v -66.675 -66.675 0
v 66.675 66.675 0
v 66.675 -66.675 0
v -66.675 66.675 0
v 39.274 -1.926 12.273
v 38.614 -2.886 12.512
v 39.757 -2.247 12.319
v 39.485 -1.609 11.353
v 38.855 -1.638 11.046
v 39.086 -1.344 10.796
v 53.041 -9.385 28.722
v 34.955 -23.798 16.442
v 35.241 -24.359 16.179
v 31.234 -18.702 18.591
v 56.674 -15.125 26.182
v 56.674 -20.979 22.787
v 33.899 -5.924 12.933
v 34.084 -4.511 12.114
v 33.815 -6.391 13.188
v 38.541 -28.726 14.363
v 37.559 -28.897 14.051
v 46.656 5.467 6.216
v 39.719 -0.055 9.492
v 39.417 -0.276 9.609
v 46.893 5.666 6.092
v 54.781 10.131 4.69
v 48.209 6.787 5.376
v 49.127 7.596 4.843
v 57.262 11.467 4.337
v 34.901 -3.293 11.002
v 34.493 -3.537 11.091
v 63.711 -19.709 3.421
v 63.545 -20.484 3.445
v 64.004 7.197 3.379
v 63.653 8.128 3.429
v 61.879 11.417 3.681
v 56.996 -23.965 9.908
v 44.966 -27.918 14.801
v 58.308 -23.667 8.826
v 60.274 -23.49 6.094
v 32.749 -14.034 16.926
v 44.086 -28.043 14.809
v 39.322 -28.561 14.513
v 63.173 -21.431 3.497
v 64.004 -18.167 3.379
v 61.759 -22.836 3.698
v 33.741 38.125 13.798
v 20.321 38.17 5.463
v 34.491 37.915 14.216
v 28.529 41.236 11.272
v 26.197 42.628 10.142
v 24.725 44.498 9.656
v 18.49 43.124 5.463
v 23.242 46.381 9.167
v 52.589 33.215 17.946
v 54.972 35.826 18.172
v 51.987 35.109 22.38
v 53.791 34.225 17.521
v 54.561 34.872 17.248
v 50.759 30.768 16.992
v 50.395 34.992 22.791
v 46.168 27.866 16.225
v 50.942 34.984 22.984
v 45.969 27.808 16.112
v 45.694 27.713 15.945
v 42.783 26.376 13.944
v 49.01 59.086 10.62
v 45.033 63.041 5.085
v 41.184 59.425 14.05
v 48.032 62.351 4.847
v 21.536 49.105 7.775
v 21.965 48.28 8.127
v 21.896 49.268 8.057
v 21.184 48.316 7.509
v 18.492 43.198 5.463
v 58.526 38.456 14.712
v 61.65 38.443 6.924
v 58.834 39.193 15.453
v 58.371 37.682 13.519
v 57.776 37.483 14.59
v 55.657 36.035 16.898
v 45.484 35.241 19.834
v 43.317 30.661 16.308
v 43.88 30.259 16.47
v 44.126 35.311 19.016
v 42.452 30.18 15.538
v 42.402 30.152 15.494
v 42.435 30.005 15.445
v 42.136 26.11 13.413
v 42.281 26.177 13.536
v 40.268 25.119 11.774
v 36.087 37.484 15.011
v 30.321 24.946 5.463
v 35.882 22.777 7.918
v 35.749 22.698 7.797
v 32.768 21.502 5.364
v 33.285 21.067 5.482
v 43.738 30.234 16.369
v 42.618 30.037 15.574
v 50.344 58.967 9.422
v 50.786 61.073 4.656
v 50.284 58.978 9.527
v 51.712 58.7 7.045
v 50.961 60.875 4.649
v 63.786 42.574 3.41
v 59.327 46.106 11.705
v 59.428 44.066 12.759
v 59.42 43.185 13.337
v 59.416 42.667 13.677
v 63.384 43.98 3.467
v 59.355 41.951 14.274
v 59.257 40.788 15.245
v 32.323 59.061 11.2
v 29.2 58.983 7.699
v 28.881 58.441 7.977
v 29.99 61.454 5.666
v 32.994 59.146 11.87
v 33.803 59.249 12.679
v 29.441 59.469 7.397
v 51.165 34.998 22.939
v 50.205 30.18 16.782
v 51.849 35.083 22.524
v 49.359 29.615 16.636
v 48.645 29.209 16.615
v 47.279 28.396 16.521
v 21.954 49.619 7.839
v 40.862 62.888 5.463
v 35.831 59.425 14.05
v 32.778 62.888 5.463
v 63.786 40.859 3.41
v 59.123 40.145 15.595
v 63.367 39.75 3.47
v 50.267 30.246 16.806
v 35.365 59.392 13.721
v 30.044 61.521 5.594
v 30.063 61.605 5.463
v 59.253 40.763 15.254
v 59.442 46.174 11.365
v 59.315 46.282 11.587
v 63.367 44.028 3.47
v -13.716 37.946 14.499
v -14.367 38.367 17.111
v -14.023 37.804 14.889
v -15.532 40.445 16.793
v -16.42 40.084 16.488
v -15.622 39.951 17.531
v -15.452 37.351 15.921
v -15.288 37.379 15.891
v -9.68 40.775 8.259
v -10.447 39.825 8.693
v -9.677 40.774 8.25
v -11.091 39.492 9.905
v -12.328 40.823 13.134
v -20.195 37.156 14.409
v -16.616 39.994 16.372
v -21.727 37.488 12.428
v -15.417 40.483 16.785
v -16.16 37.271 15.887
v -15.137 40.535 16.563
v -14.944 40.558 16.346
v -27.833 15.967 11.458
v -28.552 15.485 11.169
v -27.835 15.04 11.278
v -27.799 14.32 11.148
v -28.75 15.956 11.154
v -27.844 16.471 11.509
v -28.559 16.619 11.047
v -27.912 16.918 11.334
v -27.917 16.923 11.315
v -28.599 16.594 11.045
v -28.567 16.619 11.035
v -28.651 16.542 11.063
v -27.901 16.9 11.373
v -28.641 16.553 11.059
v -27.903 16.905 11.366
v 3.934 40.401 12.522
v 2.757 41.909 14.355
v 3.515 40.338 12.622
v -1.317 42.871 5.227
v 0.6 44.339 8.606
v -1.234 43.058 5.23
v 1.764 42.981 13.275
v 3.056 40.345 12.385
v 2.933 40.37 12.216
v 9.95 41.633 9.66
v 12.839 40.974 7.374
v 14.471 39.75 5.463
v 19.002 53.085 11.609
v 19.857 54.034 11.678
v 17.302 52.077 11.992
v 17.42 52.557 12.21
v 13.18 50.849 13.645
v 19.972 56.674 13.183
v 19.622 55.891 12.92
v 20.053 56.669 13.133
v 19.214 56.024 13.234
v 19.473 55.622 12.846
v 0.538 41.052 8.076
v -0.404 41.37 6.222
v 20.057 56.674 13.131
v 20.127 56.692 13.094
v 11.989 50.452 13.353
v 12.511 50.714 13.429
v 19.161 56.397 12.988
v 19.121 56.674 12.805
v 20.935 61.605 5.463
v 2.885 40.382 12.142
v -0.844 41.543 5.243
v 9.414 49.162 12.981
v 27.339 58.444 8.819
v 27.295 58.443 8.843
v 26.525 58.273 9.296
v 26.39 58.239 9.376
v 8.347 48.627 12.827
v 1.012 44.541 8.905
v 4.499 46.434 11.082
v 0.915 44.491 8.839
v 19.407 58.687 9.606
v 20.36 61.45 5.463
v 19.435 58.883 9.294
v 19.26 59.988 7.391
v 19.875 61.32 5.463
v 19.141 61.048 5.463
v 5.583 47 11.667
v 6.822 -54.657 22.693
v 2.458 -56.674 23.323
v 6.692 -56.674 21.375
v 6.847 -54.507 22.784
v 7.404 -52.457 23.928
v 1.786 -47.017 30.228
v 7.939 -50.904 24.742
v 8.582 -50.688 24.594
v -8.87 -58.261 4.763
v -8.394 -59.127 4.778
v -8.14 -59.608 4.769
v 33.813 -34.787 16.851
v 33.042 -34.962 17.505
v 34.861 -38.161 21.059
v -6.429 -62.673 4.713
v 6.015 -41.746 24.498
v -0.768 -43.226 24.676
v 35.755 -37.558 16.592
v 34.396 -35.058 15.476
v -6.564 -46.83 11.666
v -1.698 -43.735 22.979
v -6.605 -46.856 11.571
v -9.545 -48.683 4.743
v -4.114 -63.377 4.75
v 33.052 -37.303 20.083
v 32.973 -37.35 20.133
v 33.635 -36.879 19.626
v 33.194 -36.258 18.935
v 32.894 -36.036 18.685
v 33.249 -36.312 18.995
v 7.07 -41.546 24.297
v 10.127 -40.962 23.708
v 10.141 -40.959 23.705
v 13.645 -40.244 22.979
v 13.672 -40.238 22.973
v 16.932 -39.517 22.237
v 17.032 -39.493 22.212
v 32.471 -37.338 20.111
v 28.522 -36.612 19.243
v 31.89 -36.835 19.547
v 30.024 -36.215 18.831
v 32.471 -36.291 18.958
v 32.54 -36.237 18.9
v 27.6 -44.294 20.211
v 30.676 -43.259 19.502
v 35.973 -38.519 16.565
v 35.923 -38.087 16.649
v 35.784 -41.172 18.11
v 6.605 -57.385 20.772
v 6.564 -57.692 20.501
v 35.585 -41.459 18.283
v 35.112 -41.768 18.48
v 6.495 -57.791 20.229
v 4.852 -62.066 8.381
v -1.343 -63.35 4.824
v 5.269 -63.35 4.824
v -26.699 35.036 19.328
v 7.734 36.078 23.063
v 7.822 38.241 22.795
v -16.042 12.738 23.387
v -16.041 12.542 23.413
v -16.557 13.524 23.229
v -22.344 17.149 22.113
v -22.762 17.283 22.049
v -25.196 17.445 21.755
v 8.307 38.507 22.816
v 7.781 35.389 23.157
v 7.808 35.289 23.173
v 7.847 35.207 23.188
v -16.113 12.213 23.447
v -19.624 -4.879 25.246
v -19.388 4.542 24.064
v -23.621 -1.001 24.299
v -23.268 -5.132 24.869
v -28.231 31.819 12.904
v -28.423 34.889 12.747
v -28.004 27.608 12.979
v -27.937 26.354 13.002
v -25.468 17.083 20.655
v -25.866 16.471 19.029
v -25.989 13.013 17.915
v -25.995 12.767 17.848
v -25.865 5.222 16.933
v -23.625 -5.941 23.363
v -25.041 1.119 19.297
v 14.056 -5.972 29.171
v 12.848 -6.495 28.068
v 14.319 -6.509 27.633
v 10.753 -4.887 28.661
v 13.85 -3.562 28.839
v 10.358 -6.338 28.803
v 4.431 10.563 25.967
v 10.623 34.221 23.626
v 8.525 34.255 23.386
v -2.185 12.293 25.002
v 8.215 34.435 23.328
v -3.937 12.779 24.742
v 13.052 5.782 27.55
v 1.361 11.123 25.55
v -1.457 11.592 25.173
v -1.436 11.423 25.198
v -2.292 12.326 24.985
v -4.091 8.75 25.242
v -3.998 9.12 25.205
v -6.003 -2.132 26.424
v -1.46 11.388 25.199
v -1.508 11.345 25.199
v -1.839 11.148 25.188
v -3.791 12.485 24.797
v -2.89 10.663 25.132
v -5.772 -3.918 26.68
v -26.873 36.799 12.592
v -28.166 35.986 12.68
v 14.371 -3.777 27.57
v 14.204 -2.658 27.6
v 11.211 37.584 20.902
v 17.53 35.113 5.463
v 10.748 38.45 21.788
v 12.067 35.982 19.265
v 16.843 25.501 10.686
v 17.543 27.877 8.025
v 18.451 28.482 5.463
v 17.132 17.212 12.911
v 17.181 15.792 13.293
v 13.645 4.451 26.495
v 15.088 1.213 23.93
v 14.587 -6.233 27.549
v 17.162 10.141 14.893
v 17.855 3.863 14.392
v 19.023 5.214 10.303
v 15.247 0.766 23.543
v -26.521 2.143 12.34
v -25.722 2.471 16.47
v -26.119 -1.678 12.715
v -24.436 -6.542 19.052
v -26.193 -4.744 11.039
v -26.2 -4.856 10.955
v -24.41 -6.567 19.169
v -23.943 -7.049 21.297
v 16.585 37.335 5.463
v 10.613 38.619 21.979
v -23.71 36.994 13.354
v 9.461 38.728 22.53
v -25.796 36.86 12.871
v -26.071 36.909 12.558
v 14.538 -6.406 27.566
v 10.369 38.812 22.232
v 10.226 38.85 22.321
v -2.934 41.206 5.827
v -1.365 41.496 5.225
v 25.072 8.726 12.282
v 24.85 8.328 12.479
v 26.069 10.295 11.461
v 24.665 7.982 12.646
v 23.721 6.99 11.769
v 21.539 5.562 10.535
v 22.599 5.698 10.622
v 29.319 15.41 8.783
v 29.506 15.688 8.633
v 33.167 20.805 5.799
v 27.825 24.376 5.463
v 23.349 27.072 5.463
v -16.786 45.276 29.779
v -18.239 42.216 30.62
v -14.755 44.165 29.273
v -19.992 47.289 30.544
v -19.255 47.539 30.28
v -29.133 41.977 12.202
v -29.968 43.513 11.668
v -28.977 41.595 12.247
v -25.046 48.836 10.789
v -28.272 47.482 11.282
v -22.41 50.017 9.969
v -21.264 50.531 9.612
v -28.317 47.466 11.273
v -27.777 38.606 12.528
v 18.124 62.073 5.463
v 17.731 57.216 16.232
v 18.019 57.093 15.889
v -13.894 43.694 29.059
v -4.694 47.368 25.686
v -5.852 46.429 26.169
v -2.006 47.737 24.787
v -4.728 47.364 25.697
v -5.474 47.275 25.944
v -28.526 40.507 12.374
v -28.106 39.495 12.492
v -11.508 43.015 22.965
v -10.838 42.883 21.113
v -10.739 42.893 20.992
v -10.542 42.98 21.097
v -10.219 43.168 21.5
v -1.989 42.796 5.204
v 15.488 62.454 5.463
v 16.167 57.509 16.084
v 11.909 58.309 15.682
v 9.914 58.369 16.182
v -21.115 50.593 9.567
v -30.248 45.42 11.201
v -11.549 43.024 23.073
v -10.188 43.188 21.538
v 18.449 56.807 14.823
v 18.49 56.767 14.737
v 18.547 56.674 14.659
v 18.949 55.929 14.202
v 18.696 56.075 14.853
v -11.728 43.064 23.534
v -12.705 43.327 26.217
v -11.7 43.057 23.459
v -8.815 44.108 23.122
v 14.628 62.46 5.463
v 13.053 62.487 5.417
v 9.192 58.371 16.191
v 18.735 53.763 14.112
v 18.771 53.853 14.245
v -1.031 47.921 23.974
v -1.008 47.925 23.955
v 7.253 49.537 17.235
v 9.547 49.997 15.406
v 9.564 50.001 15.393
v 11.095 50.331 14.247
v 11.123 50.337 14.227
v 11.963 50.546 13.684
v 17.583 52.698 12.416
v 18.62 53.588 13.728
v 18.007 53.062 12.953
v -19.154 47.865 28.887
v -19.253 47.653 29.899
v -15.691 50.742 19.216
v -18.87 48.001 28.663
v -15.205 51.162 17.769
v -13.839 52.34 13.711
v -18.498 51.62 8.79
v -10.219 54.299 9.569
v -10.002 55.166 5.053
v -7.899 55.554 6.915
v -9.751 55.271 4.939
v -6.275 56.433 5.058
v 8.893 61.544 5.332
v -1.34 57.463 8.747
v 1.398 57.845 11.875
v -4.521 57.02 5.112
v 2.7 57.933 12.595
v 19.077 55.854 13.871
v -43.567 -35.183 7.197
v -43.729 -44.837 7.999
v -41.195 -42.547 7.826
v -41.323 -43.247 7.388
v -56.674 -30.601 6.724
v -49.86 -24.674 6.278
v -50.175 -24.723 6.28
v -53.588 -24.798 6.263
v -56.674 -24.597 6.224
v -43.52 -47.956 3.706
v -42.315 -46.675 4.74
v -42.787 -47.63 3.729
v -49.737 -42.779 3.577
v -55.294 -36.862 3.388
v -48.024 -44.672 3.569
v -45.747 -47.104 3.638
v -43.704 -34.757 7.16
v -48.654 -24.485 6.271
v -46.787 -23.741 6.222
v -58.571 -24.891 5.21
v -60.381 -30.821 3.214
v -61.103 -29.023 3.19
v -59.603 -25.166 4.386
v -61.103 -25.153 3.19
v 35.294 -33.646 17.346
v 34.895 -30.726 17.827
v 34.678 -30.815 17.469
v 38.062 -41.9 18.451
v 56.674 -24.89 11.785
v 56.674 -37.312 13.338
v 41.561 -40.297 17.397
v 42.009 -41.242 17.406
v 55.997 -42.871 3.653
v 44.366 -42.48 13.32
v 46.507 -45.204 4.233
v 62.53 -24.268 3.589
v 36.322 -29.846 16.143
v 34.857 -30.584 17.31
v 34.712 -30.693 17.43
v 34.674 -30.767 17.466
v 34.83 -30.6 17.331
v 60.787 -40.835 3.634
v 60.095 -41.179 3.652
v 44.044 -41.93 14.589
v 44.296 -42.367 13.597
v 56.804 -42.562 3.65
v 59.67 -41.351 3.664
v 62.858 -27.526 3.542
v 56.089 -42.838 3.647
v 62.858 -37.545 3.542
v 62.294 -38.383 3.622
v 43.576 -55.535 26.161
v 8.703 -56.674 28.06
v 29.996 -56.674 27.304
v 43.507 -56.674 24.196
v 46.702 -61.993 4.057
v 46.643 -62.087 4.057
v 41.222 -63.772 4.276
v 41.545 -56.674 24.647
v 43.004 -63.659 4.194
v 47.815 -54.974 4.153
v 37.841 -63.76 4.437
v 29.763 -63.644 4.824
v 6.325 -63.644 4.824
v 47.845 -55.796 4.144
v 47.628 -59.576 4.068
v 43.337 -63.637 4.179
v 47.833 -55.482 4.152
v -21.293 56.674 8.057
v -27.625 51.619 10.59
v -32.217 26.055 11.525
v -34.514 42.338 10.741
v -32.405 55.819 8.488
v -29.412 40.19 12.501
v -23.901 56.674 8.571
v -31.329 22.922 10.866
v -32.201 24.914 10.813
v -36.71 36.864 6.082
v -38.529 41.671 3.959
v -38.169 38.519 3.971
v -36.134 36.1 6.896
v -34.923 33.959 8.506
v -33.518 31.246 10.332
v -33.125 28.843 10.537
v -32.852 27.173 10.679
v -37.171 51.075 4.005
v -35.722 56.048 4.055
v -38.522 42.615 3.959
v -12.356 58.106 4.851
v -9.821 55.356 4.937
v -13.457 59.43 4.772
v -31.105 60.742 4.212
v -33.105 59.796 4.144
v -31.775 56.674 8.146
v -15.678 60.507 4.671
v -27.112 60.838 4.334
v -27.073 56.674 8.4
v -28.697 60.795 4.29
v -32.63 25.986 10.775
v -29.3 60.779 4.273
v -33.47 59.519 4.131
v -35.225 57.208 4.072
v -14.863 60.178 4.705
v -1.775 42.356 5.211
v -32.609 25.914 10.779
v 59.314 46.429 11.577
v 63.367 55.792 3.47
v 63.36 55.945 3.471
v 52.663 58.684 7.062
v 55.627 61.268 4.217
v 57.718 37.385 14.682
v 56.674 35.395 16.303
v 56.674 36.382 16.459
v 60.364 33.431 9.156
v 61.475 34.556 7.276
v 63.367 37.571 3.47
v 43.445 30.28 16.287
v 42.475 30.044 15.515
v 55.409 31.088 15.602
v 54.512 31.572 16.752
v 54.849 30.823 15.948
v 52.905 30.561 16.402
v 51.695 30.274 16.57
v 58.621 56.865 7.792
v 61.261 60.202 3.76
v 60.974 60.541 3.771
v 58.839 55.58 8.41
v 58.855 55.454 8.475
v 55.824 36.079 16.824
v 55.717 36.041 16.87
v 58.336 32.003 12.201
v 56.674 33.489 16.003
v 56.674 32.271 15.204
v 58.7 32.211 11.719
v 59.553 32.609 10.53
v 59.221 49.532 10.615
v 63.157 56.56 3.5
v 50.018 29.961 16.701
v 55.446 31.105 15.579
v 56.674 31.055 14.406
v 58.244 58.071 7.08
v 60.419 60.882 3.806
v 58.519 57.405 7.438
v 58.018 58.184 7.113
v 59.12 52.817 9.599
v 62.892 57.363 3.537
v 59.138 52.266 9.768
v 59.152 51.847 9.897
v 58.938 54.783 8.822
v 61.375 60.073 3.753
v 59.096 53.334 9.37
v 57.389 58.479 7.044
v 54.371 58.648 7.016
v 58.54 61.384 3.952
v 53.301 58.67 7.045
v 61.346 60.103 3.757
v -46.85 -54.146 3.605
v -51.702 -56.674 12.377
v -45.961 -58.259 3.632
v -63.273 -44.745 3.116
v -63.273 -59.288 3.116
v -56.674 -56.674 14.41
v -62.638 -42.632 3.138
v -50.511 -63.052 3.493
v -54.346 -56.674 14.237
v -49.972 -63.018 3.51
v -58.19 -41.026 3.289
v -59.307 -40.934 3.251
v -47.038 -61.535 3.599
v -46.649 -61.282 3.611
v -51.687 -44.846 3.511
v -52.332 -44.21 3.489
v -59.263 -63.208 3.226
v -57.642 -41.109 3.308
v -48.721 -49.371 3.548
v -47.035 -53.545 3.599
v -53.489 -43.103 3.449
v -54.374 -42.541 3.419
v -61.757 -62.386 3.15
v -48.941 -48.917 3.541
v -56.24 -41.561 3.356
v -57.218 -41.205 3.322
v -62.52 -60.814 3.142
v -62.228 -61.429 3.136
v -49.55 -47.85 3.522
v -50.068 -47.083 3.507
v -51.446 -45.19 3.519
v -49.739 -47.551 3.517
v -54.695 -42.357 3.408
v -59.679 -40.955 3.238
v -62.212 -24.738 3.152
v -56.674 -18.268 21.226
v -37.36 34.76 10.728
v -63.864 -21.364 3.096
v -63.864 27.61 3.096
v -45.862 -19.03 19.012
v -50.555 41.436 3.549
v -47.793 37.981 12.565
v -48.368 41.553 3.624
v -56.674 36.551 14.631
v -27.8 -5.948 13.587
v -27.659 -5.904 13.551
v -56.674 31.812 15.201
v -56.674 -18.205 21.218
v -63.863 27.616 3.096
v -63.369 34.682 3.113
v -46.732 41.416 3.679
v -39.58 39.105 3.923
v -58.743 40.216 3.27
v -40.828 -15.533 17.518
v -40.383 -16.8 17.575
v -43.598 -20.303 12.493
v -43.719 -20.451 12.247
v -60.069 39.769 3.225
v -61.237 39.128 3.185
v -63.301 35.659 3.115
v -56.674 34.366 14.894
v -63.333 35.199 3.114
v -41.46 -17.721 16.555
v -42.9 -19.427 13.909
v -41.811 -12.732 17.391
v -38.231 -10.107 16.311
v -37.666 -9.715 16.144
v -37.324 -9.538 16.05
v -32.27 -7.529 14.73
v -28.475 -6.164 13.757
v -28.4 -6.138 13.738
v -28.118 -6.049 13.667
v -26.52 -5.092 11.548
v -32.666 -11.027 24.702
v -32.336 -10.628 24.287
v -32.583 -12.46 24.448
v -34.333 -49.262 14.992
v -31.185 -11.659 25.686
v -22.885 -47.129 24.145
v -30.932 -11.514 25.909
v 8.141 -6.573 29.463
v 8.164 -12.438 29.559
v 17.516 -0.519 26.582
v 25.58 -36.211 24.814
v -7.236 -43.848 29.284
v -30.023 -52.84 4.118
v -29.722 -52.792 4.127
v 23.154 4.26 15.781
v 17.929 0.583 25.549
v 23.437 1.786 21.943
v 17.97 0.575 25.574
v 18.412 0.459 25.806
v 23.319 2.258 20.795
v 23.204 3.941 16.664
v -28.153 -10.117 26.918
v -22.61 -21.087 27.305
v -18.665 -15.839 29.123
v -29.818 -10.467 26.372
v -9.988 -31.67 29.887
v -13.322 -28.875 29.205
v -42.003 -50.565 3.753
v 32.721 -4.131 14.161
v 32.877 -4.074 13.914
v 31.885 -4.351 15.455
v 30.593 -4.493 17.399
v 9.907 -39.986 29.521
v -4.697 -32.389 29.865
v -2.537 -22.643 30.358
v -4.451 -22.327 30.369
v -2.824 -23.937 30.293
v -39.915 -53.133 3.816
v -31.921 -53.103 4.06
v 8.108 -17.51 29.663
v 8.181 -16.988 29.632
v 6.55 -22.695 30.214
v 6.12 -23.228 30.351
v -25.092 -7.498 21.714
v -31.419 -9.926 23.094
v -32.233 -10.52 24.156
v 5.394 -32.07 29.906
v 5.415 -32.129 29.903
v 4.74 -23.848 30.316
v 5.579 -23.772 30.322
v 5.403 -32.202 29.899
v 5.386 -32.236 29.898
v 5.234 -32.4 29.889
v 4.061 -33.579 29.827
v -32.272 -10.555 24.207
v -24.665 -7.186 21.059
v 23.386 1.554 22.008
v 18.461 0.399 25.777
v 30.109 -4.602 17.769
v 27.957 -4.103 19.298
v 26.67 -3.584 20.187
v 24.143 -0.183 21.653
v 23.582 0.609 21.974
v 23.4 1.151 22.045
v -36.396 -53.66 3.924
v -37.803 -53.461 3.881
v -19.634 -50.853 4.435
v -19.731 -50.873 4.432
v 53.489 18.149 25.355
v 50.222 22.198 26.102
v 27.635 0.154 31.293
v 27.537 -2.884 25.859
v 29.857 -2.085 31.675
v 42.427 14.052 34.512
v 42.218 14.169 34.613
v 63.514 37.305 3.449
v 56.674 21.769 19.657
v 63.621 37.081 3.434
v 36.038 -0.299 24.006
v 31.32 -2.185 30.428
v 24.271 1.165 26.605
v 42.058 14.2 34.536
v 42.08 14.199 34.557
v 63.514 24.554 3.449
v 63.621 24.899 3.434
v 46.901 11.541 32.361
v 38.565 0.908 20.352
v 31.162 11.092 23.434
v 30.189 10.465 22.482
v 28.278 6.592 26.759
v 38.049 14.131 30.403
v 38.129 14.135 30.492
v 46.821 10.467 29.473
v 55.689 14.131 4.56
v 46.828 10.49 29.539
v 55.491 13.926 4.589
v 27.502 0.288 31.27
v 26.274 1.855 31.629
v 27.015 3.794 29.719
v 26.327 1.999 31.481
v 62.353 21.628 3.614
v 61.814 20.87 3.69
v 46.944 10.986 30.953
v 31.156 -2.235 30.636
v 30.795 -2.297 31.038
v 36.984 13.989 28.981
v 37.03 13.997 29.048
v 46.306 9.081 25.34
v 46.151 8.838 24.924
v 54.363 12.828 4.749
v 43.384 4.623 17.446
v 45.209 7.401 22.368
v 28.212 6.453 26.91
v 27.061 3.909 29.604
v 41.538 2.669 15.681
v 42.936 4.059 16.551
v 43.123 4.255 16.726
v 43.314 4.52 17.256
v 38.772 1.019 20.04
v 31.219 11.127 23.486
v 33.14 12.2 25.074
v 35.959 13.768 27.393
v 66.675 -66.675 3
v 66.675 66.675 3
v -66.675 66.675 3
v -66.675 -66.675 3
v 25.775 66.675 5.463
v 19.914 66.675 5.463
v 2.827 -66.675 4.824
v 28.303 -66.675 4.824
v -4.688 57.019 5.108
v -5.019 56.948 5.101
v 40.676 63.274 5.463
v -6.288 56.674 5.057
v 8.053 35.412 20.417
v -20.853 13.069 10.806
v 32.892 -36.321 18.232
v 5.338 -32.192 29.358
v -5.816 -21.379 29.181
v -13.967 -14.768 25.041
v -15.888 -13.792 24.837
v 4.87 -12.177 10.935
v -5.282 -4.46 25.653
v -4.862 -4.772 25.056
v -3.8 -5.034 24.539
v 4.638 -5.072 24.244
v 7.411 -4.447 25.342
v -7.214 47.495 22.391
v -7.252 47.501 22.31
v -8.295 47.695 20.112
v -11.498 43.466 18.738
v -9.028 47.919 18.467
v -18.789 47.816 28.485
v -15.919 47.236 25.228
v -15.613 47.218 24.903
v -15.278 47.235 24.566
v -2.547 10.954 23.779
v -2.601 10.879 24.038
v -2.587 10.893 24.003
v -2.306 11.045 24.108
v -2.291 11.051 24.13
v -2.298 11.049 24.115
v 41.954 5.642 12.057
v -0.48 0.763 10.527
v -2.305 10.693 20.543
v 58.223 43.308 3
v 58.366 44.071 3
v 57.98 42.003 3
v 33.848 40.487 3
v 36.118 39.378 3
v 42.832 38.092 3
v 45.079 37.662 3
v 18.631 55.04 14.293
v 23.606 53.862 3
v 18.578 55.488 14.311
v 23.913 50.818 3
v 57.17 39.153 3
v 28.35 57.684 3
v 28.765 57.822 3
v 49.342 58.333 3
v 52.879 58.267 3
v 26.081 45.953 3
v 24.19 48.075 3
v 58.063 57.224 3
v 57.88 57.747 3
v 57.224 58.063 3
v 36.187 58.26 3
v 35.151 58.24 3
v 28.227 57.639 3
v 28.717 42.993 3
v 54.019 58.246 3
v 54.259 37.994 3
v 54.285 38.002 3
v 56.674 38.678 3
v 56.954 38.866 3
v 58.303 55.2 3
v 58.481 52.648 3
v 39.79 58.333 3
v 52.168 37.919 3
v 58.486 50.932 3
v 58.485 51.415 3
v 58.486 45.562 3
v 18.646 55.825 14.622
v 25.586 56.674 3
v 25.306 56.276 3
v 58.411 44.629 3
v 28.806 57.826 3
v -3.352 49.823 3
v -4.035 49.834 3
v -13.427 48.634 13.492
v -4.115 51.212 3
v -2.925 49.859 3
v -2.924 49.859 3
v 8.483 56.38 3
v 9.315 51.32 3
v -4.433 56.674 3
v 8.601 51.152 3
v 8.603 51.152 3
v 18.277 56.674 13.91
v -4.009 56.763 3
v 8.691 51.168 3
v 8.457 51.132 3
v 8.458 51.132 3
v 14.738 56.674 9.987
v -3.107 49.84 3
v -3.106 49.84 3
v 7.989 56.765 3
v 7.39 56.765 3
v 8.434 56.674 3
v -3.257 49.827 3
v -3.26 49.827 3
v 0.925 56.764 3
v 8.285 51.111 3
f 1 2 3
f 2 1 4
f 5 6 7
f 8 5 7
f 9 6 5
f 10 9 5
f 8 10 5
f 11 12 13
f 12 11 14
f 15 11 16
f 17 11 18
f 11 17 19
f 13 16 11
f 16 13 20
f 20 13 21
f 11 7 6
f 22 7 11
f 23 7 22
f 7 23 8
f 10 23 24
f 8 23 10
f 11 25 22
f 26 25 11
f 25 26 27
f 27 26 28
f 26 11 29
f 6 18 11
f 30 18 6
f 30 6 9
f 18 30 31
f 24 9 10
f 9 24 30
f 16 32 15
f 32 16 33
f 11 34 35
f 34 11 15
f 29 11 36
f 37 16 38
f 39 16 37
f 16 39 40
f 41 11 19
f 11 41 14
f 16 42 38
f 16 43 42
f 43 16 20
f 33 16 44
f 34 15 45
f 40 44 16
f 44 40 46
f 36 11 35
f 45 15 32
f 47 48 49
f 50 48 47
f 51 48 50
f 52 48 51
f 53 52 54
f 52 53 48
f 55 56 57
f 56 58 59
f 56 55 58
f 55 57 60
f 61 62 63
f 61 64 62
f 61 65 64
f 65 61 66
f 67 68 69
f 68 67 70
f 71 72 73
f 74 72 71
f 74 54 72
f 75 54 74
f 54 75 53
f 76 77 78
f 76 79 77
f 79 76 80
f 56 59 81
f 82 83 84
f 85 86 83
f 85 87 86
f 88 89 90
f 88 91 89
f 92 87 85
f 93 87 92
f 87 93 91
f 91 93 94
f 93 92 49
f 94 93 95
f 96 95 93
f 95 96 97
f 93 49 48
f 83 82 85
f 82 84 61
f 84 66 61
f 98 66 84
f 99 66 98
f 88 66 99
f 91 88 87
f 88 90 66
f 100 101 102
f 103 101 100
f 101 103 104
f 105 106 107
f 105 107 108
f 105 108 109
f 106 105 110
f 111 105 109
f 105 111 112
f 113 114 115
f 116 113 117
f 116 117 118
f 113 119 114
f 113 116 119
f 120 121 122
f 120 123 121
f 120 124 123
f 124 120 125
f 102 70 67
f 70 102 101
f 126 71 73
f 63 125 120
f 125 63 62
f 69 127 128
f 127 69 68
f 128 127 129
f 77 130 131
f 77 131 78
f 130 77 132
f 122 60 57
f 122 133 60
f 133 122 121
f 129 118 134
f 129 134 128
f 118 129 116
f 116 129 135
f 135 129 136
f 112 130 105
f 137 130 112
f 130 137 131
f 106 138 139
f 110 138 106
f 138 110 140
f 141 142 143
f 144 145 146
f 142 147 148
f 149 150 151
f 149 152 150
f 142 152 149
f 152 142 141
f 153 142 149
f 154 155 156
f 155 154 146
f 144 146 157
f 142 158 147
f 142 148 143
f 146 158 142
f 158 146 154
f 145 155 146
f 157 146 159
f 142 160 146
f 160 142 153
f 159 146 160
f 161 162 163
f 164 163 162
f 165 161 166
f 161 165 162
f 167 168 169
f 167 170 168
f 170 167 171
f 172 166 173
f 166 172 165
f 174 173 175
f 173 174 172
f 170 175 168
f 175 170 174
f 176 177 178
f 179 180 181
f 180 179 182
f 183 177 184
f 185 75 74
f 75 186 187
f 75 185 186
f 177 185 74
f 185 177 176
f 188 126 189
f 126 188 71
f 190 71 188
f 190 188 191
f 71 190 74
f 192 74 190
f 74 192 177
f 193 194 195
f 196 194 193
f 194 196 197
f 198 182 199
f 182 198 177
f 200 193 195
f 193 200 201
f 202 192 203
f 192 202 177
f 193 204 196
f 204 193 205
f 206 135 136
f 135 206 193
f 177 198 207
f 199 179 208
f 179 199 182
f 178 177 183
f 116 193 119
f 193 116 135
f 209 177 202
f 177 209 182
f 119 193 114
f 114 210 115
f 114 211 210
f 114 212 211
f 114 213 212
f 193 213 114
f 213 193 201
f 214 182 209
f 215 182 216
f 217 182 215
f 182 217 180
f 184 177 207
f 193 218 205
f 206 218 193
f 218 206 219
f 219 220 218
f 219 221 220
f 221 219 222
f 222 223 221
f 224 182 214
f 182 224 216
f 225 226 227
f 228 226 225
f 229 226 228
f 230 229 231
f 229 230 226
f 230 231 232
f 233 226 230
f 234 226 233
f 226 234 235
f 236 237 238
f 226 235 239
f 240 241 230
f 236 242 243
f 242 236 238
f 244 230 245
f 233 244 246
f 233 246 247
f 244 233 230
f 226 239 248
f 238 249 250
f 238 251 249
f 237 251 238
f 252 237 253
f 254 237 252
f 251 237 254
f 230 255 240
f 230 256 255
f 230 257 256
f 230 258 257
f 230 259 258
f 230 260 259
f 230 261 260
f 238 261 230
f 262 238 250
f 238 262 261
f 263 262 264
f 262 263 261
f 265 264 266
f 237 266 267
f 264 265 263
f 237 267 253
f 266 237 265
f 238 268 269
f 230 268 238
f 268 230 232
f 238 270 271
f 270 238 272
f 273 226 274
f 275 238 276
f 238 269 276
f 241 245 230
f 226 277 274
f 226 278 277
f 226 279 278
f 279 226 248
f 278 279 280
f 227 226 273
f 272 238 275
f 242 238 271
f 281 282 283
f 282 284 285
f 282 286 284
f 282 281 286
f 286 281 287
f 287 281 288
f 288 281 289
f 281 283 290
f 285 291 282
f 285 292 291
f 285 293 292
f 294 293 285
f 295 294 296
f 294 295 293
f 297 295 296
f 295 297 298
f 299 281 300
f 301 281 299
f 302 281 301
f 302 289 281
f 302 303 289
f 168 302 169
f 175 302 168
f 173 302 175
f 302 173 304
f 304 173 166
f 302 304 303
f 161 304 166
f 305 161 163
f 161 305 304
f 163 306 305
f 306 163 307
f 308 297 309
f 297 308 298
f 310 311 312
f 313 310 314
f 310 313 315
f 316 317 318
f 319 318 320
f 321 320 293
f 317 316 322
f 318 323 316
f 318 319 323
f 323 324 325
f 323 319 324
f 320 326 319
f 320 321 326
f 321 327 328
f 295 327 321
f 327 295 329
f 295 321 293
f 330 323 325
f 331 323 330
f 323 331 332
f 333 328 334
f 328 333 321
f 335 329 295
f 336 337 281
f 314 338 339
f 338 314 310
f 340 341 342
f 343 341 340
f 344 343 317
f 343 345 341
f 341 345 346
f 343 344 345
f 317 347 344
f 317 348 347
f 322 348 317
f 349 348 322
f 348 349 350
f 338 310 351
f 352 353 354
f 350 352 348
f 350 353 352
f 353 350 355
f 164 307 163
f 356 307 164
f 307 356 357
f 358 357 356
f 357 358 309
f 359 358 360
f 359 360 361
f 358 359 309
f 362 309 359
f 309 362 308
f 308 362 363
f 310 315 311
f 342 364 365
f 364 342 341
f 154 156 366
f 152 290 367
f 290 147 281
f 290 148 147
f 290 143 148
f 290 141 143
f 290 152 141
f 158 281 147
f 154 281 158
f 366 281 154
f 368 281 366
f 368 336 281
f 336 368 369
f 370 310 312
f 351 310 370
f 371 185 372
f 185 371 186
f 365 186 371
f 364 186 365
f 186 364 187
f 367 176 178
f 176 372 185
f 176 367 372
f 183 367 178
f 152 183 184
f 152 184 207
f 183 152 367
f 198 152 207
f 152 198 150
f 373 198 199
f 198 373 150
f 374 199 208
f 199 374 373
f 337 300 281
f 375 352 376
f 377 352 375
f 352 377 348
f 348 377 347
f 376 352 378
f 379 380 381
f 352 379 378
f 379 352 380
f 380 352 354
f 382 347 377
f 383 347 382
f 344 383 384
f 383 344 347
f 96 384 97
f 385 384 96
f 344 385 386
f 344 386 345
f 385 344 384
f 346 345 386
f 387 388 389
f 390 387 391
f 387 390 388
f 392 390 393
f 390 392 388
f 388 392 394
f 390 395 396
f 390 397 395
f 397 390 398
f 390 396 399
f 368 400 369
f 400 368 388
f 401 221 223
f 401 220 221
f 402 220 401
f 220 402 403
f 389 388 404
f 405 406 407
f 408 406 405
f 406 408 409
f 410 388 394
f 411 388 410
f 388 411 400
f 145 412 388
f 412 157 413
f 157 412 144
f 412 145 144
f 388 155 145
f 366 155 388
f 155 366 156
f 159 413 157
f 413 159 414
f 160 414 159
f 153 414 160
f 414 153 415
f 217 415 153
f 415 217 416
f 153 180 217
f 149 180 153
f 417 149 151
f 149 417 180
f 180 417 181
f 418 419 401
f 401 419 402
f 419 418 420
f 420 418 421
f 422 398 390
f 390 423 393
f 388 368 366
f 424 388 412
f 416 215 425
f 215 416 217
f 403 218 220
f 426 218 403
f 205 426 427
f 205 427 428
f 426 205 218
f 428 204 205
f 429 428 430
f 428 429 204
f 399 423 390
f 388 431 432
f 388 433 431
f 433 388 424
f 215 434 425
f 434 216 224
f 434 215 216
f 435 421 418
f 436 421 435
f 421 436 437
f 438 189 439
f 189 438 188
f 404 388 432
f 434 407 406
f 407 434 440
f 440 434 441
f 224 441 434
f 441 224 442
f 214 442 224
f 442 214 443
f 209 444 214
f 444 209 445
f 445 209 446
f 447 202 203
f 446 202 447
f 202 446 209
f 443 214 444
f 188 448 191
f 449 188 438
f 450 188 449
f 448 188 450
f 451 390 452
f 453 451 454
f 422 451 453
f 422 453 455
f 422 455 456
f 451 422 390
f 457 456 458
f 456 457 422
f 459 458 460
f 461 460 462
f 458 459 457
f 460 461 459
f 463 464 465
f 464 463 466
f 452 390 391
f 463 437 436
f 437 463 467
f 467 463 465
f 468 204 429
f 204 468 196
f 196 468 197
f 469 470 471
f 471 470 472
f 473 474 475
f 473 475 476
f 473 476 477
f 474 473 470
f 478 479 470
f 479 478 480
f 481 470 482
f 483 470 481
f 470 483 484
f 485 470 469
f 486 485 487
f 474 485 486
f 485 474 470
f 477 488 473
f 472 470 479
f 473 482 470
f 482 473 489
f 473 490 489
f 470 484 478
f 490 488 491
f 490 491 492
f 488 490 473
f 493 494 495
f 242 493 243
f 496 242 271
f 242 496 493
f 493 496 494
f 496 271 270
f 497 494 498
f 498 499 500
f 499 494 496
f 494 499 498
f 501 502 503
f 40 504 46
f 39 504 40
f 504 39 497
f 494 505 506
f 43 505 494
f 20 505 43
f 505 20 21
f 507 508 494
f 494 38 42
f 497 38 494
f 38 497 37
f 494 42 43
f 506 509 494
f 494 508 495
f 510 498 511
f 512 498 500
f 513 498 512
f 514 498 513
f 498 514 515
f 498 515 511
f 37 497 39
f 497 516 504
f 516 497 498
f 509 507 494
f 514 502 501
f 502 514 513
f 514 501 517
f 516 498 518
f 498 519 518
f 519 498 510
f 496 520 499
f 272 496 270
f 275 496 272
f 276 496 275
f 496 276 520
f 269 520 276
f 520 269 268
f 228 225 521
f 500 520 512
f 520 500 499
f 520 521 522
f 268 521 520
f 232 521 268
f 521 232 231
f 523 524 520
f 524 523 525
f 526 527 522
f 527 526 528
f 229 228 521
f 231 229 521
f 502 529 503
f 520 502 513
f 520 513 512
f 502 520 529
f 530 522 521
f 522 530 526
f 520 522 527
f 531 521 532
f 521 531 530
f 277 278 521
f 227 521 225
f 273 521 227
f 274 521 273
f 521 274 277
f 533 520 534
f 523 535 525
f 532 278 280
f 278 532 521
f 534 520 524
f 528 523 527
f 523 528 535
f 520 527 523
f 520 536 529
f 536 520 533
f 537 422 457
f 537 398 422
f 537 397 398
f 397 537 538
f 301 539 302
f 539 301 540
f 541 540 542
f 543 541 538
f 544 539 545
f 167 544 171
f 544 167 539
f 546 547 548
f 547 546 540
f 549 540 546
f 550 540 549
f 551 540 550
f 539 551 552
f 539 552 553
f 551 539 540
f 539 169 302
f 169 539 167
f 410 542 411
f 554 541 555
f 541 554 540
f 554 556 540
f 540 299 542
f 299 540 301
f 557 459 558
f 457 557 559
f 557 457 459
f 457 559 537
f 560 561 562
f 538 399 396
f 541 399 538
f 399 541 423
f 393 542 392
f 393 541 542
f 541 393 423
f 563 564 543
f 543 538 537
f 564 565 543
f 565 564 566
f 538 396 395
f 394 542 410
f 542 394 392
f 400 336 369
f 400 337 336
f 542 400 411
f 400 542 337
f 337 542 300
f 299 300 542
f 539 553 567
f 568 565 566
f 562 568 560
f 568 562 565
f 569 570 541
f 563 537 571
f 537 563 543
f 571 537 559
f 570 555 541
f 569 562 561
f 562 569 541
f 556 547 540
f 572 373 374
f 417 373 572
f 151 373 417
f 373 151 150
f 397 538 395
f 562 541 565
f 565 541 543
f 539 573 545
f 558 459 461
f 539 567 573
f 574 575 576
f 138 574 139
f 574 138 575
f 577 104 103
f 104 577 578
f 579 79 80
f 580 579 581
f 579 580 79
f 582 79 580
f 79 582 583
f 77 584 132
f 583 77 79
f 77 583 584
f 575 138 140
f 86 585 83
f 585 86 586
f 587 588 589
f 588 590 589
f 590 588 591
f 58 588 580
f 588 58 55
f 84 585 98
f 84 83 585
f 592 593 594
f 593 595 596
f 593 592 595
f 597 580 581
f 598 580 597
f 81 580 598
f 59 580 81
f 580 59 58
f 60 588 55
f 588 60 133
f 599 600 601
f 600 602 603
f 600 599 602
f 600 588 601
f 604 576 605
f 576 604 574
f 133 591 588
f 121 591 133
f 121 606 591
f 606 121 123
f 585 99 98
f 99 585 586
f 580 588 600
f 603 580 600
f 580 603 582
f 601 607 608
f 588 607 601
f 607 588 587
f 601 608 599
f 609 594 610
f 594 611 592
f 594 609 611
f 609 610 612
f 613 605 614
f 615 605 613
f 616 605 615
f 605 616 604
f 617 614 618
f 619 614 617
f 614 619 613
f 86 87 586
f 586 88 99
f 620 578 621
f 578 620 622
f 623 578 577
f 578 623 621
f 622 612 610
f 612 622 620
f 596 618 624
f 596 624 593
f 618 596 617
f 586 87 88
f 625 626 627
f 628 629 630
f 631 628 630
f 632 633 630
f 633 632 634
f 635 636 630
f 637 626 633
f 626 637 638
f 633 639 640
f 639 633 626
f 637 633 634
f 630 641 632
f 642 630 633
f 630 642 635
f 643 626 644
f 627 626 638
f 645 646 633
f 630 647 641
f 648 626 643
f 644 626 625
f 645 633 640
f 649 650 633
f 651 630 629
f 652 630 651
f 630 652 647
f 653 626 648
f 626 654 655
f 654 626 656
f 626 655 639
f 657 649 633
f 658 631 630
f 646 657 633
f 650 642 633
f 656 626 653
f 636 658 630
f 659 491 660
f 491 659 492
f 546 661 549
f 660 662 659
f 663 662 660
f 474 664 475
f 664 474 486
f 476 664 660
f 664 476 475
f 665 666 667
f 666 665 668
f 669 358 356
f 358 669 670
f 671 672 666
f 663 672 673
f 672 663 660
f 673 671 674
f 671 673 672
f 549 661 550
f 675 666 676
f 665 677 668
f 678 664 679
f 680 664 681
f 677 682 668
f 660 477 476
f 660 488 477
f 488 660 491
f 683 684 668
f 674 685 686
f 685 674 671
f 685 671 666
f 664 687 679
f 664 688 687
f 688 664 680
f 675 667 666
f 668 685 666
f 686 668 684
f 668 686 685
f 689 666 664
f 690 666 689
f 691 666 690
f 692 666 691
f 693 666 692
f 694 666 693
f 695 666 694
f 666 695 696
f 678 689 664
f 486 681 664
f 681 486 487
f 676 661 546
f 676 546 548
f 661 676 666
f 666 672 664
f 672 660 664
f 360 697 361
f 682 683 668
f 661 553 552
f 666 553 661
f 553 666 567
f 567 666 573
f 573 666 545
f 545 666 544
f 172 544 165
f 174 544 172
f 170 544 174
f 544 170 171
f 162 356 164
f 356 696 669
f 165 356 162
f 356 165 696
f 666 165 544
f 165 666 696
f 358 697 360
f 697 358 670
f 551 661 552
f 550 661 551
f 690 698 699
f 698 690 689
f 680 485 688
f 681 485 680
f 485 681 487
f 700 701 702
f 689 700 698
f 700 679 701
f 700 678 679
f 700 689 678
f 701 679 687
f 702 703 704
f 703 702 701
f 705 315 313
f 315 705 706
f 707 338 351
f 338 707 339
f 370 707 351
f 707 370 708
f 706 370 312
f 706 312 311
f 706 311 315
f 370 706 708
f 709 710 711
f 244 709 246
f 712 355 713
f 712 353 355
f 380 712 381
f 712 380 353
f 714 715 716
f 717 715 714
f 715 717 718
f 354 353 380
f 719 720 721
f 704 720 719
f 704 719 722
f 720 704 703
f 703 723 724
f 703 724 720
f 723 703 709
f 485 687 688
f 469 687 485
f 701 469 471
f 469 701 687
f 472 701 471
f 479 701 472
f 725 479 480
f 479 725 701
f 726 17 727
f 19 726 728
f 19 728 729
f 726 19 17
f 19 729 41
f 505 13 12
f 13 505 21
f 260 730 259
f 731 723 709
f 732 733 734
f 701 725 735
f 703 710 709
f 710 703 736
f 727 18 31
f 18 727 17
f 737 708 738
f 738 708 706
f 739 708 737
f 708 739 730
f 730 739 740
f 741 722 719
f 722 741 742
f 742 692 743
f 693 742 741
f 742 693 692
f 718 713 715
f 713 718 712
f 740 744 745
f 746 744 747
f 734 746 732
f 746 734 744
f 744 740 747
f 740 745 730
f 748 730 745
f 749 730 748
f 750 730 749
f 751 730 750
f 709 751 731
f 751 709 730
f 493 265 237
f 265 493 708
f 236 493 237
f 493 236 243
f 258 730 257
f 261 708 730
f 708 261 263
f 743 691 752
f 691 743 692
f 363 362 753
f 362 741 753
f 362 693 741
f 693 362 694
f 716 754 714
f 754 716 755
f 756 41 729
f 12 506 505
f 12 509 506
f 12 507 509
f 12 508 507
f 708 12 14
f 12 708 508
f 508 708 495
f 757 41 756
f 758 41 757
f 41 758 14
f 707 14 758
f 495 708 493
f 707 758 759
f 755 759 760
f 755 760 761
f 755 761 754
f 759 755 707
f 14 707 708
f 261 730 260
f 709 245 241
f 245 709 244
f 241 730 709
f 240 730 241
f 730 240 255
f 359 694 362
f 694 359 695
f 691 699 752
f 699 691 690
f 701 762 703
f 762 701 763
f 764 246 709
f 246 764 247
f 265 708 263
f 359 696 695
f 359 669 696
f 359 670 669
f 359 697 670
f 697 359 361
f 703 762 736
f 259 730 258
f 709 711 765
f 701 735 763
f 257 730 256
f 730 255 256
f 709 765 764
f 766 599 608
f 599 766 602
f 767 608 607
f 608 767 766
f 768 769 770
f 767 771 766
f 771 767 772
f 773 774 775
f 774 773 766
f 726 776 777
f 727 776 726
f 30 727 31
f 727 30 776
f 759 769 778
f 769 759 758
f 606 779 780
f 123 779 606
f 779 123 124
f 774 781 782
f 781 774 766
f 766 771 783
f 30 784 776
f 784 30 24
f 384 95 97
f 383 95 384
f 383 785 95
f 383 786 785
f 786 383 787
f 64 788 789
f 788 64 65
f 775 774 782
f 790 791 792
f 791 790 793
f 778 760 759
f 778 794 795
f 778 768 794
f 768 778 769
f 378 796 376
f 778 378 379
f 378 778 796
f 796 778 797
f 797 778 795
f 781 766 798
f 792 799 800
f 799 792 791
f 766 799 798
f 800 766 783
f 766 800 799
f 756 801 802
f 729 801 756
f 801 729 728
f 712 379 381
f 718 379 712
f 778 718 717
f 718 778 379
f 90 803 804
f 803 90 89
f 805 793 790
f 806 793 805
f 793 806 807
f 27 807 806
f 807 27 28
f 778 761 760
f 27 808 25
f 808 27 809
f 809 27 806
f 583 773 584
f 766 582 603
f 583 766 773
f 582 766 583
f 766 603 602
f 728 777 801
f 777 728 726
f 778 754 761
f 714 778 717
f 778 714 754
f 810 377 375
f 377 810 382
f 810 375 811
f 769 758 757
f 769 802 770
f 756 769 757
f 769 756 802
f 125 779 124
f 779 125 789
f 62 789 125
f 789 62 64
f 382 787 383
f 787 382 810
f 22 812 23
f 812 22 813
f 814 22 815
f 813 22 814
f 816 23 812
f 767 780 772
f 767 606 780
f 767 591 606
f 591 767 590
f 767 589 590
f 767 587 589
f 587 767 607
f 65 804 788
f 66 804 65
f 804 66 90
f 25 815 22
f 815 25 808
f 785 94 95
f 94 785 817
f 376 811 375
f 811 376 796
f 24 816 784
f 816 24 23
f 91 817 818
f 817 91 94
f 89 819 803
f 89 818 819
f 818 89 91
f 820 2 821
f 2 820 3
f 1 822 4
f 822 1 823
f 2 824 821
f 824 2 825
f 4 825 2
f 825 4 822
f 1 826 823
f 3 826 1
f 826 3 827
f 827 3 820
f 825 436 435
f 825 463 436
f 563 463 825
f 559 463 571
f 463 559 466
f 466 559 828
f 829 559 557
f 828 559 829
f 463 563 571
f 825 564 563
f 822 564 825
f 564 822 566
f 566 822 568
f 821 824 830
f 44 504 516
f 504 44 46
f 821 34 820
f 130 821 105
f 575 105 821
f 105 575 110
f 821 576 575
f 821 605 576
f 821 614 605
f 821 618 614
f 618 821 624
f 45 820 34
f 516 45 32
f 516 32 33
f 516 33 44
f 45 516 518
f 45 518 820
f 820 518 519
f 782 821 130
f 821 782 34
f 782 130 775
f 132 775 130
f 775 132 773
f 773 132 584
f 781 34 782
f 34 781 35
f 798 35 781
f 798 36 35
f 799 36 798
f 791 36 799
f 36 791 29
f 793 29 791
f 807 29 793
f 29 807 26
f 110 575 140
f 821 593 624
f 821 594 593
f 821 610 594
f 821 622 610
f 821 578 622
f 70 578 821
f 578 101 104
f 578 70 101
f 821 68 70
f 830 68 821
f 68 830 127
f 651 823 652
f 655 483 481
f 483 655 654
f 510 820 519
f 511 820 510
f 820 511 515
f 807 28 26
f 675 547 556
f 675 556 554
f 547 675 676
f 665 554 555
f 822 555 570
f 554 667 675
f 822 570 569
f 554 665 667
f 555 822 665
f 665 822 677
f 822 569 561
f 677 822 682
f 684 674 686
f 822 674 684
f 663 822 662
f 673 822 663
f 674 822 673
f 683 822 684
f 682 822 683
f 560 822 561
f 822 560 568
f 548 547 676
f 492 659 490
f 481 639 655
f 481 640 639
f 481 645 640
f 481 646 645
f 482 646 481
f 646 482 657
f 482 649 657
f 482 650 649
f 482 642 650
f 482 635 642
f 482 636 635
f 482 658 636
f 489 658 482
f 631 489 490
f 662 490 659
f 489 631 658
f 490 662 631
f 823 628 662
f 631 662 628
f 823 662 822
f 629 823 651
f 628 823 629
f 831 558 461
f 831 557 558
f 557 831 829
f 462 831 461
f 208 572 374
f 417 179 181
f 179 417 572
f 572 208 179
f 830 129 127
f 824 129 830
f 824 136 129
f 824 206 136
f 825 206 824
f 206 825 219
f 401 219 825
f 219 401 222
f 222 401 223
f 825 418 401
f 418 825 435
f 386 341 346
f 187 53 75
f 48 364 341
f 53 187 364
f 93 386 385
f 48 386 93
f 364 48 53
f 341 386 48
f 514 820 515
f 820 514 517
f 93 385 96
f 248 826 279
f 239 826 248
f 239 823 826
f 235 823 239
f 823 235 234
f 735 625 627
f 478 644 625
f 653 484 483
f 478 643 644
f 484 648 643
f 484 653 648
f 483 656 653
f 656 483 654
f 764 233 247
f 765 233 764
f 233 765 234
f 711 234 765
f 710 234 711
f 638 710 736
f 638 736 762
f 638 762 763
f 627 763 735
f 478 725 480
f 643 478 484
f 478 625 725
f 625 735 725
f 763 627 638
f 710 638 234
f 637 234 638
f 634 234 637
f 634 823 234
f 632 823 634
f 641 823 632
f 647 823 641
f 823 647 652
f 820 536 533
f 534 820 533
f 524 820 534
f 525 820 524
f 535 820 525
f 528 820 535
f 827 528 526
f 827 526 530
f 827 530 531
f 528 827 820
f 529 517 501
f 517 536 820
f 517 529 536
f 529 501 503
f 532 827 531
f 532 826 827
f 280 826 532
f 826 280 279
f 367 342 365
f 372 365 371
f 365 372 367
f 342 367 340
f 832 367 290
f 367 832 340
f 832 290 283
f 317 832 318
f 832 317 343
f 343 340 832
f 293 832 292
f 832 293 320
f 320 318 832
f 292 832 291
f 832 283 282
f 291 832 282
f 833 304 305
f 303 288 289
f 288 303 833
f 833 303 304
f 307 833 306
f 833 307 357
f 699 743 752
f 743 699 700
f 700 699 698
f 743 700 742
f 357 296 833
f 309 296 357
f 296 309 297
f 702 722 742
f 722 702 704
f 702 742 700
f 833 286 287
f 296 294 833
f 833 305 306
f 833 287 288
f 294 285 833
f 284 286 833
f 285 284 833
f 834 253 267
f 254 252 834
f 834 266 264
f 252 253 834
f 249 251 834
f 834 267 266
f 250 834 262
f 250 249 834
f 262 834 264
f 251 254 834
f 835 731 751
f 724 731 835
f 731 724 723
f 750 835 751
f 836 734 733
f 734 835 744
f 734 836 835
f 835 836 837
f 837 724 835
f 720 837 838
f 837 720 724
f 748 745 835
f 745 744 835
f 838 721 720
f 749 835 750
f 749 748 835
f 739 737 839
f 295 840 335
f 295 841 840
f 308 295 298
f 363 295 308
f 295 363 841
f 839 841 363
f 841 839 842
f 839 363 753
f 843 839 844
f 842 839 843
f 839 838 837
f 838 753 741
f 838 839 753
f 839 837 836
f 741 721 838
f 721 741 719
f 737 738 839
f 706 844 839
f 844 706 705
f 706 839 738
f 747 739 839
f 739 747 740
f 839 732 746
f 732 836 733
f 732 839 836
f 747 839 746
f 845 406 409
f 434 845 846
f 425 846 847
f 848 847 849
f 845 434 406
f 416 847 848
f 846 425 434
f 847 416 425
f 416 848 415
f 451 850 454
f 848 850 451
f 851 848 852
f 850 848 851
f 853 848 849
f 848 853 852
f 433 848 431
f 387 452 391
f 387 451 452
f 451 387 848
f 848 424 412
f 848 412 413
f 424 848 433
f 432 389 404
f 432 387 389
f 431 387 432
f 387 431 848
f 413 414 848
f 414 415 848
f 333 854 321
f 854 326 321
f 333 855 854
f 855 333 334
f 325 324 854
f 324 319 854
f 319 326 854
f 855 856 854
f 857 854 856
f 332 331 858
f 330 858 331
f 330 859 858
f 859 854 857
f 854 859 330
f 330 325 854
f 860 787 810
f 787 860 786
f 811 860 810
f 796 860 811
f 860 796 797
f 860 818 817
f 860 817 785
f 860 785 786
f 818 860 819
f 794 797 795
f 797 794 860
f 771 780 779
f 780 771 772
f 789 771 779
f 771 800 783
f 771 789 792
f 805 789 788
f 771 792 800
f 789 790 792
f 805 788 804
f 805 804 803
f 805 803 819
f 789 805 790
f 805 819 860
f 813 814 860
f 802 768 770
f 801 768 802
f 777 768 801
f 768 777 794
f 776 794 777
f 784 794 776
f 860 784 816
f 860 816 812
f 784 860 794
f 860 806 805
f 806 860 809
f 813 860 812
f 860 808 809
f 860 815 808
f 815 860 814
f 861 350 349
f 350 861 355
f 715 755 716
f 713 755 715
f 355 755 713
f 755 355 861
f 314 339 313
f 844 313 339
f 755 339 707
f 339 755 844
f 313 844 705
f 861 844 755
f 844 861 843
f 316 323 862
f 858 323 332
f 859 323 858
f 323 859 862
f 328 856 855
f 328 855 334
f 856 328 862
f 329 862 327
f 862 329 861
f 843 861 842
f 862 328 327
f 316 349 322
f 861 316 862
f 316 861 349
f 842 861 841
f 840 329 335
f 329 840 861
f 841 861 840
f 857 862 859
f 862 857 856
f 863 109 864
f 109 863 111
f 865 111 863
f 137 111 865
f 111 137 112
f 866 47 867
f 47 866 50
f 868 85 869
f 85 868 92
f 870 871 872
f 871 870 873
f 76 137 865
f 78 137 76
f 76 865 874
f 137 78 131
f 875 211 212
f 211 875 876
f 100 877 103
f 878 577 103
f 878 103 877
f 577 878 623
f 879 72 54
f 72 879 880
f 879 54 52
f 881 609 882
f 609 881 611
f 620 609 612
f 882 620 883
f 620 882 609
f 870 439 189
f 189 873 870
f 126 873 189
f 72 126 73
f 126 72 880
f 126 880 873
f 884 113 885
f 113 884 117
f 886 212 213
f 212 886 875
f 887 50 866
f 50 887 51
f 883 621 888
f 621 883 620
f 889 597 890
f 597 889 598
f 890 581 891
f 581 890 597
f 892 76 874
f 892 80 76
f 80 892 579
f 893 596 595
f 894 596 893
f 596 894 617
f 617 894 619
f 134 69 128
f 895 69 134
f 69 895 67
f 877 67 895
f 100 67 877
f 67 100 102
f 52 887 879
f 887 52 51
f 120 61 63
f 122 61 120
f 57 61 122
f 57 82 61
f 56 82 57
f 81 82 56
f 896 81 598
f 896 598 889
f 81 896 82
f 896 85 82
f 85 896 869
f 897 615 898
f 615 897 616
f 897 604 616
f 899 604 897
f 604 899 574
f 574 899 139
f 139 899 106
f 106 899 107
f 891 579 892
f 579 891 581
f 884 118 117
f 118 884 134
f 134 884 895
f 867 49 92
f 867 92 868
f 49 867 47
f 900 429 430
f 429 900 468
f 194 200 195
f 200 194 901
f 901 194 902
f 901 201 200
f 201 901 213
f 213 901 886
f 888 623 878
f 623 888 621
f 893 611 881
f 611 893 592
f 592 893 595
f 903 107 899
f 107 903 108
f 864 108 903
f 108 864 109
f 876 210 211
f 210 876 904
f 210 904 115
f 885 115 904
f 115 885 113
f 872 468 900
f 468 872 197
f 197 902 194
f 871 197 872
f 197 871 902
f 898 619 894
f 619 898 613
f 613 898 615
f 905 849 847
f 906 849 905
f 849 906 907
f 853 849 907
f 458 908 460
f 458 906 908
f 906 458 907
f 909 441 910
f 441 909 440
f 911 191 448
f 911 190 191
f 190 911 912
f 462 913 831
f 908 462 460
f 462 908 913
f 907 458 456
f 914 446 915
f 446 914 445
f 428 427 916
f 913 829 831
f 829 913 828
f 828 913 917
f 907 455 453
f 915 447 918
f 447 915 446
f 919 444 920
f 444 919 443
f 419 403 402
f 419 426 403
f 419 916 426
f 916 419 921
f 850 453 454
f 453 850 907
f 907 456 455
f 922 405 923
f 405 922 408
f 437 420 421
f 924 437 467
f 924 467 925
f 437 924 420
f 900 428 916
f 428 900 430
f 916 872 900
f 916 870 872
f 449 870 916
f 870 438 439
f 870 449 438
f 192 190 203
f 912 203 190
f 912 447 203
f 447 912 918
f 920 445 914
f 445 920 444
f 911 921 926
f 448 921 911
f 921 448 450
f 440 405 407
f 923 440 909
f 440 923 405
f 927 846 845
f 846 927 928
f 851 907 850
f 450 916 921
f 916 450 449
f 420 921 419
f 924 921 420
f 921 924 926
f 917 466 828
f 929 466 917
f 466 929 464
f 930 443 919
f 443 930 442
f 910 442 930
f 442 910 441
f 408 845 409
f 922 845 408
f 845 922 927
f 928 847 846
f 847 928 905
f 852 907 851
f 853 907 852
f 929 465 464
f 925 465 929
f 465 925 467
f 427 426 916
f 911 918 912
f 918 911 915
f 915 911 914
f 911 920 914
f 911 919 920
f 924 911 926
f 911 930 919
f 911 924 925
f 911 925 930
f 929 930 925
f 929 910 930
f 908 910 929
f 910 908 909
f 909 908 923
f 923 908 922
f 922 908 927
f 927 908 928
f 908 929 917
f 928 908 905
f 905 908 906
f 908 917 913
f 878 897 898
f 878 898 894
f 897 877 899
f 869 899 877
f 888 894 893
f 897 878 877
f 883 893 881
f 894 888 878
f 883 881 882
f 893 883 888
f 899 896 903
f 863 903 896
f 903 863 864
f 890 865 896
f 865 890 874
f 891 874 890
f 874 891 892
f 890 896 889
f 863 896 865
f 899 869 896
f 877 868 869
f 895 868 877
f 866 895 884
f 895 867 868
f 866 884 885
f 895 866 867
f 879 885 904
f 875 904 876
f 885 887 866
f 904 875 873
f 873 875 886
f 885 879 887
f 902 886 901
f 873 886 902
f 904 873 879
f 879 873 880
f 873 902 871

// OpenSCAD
//
part = 1; //[1,2,3,4,5,6]
//Basic Width
W=133.35 ;
//Basic Breadth
B=133.35 ;
//Basic Height
H=25.4 ;
//Basic Base
Base=3;
//Rubble Size
AvrgFeatureSize=46 ;
//number of
cubes=18 ;
//number of
spheres=4;
//number of
cylinders=3;
//number of
mounds=2;
//Height adjustments 
MoundHeightMultiplier=0.5;
// Cratering adjustments
Cratering=2;

/* [Hidden] */


Az=AvrgFeatureSize;

//basic base
 translate([-W/2,-B/2,0])cube([W,B,Base]);
// rubble and mounds  differenced with a upsideown rubble pile for some craterinf

difference(){
union(){
plate();
mounds();}


translate([0,0,H +Az])rotate([180,0,0])scale([1,1,Cratering])plate();
}




// basic rubble pile
 module plate(){
intersection(){
// extra bounded to make sure
 translate([-W *0.5,-B *0.5,0])cube([W ,B ,H+Az]);
union(){

// cubes
if(cubes>0)for(i=[1:cubes]){
q1=rndc()*Az+[0.1,0.1,0.1];
put()scale(q1)cube(center=true);
 
}
//speres
if(spheres>0)for(i=[1:spheres]){
 
q2=rndc()*Az+[0.1,0.1,0.1];
 
 put()scale(q2 )sphere($fn=15,center=true);
}
// cylinders
if(cylinders>0)for(i=[1:cylinders]){
 
q3=rndc()*Az+[0.1,0.1,0.1];
 put()scale(q3 )cylinder($fn=15,center=true);
 }

 
 }


}
 translate([-W/2,-B/2,0])cube([W,B,Base]);

}
module mounds(){
// Mounds or minor hill
if(mounds>0)for(i=[1:mounds]){
intersection(){
 translate([-W *0.5,-B *0.5,0])cube([W ,B ,H+Az]); 
hull(){
 translate([-W *0.5,-B *0.5,0])cube([W ,B ,Base]);
translate([-W *0.85*0.5,-B*0.85 *0.5,0])translate([rnd(W*0.85) ,rnd(B*0.85) ,rnd(H*MoundHeightMultiplier)])scale(Az*0.5,Az*0.5,Base)cylinder(r1=1,r2=1,h=0.01, $fn=7);
 }
 }}}
// rapper for  Ground module
module put ()
{
R=rndR();
v=v3rnd();
V=[v[0]*(W/2-H*0.3),v[1]*(W/2-H*0.3),abs(v[2])*H/4];
 

ground()  translate(V)rotate(R)children();
 
}

 
//  create a footprint  and join with feature 
module ground()
{
hull(){

intersection(){
 translate([-W*0.85*0.5,-B*0.85*0.5,0])cube([W*0.85,B*0.85,H+Az]);
children();
}
 linear_extrude(0.01)offset(r=H*0.2,$fn=7)intersection(){
 square(W*0.9,B*0.9,center=true);
 projection() children();
}
}
}

// helpers
function rndR()=[rands(0,360,1)[0],rands(0,360,1)[1],rands(0,360,1)[0]];
function rnd(a = 0, b = 1) = (rands(min(a, b), max(a, b), 1)[0]);
//random number 

function rndc() = [rands(0, 1, 1)[0], rands(0, 1, 1)[0], rands(0, 1, 1)[0]];
//random color triplet or other use 0 to 1 triplet

function v3rnd(c=1) = [rands(-1, 1, 1)[0] * c, rands(-1, 1, 1)[0] * c, rands(-1, 1, 1)[0]] * c;
//general use -1 to 1 triplet
